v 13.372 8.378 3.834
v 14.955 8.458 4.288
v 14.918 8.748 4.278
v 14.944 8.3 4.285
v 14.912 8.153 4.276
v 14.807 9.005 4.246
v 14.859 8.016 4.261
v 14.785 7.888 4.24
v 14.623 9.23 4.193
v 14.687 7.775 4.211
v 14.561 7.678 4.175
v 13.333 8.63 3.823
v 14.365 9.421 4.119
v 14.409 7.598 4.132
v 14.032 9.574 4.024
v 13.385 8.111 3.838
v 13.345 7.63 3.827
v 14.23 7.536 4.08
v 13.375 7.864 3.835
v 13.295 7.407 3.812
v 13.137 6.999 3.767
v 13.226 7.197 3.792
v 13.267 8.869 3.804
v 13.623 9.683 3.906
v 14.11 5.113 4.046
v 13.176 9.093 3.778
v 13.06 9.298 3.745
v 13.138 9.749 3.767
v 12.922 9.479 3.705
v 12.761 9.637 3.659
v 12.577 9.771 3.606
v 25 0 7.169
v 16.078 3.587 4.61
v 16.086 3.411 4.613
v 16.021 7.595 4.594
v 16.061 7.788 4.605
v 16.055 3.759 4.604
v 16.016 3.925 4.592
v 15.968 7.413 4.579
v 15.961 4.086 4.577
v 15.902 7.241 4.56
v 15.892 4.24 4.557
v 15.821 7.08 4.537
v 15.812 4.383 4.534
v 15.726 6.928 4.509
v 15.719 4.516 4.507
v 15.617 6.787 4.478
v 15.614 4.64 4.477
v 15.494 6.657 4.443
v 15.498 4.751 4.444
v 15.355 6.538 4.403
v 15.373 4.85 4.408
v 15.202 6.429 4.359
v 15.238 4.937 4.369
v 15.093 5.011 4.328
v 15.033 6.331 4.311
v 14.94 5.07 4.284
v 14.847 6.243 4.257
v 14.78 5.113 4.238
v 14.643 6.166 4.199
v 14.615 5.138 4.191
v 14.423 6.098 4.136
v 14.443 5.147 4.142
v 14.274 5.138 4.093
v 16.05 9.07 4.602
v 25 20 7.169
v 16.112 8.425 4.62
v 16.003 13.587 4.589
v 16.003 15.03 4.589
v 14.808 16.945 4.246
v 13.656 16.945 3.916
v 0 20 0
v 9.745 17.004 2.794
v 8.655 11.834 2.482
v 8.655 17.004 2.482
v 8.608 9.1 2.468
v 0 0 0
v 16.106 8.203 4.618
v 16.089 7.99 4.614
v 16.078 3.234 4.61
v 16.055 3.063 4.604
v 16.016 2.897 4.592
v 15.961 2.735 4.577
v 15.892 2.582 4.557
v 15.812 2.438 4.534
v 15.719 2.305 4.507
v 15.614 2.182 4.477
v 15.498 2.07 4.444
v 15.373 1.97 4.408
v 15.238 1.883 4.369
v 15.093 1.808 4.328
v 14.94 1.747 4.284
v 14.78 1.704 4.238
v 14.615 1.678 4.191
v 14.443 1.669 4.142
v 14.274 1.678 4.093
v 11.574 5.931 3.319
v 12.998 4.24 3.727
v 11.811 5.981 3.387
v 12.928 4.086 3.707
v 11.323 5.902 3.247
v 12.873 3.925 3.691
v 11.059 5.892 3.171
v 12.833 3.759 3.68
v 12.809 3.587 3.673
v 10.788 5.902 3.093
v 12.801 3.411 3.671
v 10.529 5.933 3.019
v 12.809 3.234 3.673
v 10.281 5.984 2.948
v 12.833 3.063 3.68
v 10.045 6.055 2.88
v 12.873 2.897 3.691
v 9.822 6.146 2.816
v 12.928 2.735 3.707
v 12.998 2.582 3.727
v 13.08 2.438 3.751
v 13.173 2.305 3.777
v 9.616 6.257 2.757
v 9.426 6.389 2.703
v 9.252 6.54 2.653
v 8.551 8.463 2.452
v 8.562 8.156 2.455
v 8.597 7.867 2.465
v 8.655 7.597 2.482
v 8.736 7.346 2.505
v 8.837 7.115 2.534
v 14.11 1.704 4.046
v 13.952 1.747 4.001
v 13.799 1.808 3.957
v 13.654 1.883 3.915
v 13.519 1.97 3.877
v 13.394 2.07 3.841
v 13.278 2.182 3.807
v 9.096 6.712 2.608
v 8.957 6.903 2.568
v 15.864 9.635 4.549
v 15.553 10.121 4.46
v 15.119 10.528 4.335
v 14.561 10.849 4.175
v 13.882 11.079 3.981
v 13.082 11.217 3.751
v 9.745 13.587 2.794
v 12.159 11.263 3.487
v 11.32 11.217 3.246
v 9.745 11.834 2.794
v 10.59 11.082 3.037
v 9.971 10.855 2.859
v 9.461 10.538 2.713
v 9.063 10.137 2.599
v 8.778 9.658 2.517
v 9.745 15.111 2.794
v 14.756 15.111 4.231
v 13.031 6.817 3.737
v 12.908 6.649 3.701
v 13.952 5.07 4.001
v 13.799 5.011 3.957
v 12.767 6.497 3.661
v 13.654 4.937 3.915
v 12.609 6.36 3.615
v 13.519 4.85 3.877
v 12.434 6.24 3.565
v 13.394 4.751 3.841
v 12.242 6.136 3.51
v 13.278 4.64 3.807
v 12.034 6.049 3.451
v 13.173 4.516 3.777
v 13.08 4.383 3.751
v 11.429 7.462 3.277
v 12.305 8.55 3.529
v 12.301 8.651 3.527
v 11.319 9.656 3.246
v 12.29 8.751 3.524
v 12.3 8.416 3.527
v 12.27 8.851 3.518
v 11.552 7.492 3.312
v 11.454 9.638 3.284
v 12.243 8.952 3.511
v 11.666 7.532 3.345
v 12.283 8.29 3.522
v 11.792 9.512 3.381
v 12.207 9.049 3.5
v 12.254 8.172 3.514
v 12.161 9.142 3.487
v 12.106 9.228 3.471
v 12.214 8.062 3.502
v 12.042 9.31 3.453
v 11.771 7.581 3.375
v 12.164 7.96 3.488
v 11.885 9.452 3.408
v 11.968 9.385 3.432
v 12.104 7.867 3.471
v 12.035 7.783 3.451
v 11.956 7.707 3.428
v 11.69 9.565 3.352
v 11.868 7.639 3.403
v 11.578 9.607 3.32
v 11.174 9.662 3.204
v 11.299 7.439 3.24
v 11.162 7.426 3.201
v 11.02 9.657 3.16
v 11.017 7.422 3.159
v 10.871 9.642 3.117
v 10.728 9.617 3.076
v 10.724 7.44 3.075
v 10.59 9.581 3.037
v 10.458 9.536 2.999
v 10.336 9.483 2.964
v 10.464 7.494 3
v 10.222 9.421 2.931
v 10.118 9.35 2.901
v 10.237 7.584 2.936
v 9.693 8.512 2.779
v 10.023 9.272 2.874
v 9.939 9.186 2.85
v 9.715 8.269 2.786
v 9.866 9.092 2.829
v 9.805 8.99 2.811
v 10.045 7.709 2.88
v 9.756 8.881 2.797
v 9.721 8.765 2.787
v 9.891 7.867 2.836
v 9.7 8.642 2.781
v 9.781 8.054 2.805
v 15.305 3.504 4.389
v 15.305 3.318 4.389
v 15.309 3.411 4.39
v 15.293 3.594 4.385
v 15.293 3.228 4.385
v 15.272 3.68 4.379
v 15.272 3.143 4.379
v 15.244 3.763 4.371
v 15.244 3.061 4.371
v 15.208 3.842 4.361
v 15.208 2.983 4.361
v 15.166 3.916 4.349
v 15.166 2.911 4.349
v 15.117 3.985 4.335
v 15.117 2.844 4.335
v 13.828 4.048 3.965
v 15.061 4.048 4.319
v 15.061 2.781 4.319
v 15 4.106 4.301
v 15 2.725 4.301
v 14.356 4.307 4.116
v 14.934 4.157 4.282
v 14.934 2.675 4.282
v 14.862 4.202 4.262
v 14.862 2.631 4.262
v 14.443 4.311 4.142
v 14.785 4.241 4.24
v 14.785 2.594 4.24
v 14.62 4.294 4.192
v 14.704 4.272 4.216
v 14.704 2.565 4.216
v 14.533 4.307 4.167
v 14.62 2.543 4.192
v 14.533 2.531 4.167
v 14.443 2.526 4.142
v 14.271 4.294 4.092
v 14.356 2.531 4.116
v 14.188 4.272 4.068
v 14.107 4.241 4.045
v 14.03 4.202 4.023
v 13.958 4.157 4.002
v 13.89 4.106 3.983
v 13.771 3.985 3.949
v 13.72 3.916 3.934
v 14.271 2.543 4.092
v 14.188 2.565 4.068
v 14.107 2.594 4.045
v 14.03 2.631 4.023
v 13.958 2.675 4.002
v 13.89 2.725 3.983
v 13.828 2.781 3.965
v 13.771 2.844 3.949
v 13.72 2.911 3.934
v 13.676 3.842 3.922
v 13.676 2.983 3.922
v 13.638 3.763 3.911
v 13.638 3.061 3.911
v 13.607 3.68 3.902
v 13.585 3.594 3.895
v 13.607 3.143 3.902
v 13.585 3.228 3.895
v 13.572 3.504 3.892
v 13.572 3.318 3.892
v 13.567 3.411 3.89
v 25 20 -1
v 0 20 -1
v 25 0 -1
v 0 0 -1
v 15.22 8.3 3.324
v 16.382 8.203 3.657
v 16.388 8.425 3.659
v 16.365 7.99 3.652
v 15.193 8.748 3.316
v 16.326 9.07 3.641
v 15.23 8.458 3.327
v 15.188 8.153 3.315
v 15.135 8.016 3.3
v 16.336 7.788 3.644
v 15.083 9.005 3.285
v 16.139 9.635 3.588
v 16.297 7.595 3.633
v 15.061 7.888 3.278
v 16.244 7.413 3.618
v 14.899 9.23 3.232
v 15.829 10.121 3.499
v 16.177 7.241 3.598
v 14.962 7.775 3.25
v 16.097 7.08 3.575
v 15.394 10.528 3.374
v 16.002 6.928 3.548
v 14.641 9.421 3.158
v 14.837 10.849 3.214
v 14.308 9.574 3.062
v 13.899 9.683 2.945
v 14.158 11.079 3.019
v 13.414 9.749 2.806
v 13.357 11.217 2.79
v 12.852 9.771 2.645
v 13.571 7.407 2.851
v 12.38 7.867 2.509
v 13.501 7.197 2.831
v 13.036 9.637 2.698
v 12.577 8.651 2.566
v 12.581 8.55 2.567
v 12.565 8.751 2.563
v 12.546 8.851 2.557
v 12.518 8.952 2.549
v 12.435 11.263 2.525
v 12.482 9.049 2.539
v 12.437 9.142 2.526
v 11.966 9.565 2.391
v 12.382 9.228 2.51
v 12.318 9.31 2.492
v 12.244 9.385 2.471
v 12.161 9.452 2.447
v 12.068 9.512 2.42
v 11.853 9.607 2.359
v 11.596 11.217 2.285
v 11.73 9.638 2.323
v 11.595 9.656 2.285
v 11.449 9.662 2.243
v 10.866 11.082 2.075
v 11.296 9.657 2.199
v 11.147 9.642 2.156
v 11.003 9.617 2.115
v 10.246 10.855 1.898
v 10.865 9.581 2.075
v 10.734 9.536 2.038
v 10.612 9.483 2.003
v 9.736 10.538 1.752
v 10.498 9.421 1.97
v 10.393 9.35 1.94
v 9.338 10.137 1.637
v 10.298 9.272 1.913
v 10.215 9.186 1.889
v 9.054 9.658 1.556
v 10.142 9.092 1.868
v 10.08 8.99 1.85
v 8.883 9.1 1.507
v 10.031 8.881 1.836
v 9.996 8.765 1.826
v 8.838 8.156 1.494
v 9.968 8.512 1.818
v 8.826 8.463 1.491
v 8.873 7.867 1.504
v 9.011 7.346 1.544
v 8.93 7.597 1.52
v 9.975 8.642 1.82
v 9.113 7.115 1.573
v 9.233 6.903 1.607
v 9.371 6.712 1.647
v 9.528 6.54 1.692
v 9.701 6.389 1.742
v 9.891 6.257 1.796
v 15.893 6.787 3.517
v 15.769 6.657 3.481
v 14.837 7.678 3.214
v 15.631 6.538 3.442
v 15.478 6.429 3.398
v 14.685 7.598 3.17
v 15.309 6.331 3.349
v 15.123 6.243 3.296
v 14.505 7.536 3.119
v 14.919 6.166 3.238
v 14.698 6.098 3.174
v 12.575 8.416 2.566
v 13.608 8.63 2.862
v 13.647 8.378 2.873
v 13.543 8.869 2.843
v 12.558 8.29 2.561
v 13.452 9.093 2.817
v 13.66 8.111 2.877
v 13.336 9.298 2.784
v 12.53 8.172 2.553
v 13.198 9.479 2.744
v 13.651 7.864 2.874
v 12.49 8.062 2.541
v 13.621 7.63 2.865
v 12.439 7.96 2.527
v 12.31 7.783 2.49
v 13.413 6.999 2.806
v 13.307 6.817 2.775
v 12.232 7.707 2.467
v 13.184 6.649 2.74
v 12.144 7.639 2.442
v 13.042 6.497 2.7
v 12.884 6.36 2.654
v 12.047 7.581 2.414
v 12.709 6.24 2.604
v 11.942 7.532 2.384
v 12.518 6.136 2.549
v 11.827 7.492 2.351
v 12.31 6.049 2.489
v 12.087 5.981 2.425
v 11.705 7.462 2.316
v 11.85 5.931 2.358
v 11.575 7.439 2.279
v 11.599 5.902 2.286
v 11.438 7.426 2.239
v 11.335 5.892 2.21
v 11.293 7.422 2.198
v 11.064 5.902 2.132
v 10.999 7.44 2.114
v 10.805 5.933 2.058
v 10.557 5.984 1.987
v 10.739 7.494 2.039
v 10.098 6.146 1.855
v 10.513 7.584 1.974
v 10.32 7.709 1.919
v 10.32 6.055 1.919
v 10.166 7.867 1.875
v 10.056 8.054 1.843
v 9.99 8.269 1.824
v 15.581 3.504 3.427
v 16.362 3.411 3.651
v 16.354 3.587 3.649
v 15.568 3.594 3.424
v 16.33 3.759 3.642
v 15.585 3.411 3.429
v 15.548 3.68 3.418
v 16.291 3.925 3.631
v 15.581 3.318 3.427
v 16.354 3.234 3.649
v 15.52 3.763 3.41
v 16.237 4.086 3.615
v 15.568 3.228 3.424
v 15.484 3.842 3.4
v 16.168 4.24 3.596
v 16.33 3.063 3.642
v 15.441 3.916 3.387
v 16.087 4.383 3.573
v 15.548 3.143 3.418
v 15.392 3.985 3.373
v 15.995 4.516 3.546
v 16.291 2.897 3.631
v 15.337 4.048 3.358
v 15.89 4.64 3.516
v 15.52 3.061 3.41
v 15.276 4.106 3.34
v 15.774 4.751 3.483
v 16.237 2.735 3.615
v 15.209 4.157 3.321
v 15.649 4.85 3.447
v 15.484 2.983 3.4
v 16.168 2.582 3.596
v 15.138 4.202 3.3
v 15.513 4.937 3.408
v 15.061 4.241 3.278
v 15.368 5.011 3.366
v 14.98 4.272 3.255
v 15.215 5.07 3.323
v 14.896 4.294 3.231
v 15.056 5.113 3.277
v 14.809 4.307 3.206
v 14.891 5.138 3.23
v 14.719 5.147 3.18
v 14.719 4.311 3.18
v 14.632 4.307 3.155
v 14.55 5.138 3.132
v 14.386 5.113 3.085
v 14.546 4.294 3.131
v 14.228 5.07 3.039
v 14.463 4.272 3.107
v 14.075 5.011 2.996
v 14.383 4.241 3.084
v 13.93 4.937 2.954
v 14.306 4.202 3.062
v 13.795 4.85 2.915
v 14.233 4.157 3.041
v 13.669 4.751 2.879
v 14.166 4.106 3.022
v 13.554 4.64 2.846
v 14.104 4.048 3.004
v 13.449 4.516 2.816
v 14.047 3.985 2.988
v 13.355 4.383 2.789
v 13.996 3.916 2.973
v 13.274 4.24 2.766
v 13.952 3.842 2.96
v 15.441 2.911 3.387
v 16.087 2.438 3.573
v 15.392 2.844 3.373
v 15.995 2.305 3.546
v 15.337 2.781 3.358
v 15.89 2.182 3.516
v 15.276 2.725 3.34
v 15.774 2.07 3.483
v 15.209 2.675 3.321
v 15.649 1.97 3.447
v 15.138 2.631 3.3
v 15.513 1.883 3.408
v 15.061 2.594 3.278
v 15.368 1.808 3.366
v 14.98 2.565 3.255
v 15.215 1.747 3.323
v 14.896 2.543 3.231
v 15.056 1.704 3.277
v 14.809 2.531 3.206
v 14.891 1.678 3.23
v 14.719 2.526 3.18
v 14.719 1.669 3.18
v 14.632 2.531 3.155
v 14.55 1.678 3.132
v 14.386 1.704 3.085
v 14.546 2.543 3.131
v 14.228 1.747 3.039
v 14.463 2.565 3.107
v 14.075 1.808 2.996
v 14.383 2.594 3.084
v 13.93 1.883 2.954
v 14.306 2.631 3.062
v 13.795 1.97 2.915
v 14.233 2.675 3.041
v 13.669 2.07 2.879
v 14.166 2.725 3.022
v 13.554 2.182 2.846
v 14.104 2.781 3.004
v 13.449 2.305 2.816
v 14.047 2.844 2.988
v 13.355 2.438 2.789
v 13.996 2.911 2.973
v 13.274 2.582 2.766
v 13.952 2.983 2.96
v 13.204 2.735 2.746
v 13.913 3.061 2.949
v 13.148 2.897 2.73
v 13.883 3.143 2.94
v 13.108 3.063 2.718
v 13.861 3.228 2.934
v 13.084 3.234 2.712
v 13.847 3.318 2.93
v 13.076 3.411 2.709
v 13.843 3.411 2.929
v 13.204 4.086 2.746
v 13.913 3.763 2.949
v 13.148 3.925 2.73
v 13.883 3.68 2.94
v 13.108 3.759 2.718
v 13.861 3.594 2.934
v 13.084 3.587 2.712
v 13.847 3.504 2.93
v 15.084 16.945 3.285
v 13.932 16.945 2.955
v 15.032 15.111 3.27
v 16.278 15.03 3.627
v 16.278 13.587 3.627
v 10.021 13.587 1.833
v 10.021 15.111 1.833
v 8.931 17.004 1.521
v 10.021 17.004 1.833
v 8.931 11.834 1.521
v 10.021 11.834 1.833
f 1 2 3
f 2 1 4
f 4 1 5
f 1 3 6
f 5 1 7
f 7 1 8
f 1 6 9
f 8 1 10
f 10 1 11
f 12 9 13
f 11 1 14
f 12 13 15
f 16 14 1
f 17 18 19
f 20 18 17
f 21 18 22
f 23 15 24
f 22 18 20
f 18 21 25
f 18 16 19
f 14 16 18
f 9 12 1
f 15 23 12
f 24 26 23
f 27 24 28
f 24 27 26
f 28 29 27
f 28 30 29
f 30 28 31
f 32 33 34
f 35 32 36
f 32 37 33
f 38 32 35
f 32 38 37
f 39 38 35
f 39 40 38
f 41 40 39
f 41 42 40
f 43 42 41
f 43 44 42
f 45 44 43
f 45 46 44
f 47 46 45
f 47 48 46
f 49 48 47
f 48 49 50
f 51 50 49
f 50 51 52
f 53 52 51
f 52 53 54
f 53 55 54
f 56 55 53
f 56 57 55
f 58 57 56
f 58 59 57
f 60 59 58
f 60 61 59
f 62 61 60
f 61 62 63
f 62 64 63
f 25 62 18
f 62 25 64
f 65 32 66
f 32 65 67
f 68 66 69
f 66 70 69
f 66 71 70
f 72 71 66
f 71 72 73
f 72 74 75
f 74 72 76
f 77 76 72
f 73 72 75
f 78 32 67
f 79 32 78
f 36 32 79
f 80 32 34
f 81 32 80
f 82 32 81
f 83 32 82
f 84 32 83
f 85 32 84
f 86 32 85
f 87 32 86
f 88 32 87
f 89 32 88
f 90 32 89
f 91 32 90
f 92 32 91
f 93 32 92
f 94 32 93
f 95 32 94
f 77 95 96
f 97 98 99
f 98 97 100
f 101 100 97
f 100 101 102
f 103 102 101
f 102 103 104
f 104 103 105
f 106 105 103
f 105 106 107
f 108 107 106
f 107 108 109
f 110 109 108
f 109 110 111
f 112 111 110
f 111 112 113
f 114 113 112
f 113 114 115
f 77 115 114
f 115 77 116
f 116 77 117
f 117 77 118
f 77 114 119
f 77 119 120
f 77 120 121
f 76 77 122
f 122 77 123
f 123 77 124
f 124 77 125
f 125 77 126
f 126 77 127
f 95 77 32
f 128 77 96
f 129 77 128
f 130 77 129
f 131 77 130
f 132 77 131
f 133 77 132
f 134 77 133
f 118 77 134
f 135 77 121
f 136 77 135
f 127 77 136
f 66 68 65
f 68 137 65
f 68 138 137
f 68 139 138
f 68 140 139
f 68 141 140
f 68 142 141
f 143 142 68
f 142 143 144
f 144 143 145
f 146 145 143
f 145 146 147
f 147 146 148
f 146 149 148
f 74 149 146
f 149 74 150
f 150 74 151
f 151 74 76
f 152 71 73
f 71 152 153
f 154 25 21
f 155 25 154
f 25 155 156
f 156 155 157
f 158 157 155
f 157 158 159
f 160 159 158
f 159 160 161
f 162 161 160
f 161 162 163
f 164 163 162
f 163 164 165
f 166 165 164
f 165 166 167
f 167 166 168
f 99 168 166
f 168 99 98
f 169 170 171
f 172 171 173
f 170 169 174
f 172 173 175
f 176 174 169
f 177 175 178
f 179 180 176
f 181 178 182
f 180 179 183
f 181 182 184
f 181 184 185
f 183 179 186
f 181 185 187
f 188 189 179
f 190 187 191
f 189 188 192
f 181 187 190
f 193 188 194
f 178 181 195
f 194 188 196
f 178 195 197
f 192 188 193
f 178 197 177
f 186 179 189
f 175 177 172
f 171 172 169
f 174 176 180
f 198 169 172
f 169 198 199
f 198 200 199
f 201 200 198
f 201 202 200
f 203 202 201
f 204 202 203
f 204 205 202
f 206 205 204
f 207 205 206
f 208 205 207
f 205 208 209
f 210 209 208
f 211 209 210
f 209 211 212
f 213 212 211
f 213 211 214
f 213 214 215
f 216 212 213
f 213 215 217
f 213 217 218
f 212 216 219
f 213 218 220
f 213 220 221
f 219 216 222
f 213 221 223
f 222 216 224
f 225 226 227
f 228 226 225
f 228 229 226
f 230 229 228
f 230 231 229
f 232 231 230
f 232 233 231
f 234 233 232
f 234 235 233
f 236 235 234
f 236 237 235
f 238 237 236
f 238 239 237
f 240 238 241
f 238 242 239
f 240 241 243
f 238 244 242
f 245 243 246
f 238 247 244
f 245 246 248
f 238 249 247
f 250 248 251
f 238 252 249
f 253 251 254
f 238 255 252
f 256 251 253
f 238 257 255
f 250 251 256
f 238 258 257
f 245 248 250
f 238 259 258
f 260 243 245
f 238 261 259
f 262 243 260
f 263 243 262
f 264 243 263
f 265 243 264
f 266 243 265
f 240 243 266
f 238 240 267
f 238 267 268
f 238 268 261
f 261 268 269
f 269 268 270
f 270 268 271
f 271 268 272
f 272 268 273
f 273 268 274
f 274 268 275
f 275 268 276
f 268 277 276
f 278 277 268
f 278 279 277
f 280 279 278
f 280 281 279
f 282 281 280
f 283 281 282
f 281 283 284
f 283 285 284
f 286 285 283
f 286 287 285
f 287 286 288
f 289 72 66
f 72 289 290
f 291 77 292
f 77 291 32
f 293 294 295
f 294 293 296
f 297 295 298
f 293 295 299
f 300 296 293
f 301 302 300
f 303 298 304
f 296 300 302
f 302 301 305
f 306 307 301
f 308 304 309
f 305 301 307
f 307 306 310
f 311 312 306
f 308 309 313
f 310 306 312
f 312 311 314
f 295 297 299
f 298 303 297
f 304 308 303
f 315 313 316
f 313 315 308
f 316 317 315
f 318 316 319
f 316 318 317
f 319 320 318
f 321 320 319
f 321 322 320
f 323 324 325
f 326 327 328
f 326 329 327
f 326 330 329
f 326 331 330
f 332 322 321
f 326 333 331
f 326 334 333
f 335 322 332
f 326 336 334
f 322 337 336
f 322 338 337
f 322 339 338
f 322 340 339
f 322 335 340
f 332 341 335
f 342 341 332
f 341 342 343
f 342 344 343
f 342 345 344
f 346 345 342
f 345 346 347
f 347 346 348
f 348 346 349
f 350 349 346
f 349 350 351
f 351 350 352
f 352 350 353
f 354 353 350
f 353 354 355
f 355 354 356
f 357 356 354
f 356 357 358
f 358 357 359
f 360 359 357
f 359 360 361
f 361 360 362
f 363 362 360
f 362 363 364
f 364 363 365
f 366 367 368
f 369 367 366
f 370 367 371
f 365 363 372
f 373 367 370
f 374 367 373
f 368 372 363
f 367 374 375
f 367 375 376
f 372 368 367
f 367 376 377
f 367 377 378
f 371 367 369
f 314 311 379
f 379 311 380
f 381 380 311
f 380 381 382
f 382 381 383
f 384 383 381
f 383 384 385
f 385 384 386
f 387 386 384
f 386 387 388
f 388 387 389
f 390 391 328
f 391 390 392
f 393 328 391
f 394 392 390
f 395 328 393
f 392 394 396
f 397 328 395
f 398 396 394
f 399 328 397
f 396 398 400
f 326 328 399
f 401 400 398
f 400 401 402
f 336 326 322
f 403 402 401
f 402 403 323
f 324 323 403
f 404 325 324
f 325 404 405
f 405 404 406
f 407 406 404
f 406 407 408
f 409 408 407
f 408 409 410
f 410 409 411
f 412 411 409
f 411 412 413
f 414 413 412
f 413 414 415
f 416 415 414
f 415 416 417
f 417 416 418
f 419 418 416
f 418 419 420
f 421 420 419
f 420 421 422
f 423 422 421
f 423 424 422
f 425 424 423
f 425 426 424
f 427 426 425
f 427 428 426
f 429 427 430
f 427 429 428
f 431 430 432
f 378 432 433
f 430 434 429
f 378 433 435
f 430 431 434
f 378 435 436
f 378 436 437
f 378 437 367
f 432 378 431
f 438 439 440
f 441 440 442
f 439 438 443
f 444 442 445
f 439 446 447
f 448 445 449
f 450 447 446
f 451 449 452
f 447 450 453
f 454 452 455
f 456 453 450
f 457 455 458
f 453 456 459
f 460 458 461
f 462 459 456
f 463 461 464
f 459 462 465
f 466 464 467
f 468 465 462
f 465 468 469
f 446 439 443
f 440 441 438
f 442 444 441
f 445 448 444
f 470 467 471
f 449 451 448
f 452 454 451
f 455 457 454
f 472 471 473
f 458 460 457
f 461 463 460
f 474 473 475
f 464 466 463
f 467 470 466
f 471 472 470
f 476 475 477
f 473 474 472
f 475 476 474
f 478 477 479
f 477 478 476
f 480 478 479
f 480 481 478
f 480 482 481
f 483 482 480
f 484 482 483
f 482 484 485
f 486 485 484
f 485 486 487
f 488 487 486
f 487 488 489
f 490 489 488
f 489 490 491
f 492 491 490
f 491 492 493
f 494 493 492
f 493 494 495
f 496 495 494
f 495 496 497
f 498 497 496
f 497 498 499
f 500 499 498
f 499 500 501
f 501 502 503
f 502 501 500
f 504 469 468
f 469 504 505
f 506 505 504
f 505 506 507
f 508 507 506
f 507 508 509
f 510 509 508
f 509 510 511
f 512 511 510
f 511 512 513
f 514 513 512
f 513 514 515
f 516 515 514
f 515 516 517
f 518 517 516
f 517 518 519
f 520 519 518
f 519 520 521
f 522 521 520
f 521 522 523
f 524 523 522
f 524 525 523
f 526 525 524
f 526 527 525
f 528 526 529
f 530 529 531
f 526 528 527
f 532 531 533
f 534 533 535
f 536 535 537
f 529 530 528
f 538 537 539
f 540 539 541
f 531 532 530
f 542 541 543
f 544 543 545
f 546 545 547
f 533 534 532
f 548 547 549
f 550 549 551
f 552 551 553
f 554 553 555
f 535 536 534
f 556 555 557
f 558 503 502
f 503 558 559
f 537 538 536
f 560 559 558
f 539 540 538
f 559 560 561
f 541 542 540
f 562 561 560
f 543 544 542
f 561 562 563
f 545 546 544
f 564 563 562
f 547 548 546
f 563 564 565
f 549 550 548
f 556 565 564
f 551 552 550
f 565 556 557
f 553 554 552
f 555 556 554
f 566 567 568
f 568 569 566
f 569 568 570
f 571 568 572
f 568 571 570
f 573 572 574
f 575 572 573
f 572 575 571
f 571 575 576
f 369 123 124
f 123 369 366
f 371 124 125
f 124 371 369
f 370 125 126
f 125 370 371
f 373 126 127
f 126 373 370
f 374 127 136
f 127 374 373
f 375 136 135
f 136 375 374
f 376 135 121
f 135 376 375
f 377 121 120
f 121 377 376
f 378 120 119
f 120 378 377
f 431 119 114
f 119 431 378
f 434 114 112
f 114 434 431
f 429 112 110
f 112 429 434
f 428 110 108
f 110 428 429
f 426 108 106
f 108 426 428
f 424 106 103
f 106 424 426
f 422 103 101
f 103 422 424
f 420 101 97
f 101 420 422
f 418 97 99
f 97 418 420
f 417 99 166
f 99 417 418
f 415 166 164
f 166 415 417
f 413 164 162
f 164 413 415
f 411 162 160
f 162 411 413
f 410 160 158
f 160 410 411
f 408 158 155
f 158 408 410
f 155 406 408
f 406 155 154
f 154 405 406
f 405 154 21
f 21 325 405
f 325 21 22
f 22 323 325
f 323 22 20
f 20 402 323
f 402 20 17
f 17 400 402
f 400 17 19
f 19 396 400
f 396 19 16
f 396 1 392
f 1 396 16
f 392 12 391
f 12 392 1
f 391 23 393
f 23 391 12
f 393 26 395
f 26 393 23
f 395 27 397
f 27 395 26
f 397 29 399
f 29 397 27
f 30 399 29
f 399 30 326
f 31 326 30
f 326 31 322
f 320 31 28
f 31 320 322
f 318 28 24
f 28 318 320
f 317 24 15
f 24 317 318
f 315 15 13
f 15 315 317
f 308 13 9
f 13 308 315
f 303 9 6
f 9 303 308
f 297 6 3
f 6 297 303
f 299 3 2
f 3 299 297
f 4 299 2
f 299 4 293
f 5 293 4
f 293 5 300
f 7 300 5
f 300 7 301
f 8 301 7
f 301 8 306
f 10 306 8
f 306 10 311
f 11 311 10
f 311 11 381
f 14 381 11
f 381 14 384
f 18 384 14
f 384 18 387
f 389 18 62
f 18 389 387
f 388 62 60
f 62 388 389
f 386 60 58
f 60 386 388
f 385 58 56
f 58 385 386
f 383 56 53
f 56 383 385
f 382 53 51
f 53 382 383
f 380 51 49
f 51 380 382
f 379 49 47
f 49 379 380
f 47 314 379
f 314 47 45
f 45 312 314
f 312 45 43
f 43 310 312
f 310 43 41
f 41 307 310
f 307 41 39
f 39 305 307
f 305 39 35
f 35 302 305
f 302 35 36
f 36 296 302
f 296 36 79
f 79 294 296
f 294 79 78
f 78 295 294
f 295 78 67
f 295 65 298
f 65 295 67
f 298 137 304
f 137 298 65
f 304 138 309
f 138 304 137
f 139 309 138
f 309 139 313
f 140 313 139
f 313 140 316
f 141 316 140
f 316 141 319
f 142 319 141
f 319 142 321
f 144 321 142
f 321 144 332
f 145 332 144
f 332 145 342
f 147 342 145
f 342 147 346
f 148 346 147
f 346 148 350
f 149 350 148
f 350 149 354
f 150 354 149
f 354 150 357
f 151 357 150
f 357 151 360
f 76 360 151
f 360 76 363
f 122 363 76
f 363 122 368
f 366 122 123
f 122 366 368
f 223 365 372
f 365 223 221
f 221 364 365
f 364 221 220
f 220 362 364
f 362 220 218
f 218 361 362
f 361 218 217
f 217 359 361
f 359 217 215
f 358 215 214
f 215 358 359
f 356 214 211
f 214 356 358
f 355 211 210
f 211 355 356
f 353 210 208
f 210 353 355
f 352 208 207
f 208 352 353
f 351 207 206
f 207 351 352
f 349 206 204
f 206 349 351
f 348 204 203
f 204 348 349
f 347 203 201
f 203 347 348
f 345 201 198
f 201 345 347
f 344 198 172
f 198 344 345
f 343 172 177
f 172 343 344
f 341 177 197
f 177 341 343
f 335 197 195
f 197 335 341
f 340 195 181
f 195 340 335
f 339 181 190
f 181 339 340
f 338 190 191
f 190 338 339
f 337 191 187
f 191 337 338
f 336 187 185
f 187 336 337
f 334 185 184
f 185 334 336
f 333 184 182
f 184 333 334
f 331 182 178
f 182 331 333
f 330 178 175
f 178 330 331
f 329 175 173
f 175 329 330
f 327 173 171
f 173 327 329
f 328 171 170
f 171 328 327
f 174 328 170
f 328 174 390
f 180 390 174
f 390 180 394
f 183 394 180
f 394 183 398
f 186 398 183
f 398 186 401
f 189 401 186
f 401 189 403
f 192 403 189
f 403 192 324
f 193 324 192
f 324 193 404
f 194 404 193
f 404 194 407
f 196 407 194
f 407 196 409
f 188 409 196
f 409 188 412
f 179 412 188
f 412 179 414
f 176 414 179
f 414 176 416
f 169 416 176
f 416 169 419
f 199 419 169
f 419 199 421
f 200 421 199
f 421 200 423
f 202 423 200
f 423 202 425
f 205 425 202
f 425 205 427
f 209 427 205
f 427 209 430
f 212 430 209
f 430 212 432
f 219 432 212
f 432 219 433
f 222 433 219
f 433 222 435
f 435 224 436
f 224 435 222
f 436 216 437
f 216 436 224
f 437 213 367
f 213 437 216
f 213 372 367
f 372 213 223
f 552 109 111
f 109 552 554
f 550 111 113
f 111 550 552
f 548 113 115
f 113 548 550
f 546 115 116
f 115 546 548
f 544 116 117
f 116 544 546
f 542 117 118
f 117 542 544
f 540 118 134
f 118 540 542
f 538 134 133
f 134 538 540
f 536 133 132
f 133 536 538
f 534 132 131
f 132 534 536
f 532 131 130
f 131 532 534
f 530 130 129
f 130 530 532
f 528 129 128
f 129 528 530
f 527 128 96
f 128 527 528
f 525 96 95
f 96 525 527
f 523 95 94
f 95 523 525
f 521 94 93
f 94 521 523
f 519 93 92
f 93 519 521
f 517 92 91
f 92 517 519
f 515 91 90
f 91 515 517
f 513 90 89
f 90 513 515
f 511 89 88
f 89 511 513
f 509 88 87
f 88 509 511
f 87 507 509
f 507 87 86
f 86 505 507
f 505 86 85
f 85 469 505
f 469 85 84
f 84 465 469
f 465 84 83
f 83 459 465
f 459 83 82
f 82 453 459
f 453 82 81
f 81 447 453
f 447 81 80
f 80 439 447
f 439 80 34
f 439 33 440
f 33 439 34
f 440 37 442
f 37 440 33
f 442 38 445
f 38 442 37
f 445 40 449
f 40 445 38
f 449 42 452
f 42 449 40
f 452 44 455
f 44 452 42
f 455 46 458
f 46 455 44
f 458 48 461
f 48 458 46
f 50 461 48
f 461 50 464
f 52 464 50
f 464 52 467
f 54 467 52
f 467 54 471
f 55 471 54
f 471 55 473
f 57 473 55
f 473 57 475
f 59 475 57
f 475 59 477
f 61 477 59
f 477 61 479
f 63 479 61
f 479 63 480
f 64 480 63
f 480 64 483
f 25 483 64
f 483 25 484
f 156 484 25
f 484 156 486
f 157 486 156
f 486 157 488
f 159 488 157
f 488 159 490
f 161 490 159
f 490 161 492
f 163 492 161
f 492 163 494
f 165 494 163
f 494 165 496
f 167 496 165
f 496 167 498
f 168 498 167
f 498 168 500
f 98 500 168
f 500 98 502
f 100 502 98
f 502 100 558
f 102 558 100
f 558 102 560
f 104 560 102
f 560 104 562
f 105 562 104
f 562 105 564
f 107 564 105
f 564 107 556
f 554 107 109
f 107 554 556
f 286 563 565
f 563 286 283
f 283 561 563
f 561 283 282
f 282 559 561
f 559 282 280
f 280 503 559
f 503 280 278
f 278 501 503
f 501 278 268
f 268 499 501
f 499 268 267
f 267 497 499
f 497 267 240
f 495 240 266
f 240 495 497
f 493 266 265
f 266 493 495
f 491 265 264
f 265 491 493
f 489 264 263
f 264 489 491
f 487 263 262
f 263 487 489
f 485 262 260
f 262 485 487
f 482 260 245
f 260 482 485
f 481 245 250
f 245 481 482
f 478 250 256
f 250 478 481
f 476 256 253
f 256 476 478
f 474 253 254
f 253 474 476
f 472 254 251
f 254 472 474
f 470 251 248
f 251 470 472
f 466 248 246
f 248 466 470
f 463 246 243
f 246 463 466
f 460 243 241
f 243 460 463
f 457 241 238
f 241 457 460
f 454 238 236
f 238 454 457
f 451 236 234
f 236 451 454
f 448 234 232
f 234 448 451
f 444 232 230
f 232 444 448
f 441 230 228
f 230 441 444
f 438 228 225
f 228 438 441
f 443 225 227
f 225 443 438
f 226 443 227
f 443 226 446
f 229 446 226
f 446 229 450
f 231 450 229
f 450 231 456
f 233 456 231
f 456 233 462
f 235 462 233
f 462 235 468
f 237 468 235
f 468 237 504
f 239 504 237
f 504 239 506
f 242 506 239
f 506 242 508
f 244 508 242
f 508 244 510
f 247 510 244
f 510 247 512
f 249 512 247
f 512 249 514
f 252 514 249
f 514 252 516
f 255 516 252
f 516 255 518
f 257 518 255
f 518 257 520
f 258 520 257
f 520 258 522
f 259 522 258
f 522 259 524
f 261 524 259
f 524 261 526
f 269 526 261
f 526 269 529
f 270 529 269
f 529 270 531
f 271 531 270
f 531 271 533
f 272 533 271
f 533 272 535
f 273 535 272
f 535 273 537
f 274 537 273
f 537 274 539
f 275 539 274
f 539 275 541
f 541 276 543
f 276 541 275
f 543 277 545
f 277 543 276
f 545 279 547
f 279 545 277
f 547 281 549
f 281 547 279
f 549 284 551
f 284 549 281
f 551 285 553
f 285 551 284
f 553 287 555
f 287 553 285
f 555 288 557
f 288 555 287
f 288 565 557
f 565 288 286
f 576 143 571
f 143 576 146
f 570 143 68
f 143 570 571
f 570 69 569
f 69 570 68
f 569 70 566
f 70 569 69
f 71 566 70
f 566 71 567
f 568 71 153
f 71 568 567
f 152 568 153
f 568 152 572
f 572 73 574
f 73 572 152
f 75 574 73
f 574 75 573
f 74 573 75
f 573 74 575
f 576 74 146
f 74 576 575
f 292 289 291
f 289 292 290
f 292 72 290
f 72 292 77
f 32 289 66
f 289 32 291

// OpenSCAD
// This work was created by David Turnbull and released under a 
// Creative Commons Attribution 4.0 International License.

// Which part would you like to see?
part = "Main"; // [Main:Angle Guide Block,Text:Text For Multi Extruder]
// Blade guide angle
angle = 16; // [10:1:40]
// Rubber band slot width (0=none)
width = 0; // [0:6]


if (part == "Main") {
    bandselect();
} else {
    rotate([0,-angle,0])
    mark(1);
}

module bandselect() {
    ht = tan(angle) * (19-width/2) - 2.5;
    
    if (ht < 1.5) {
        banded(1.5);
    } else if (ht > 4) {
        banded(4);
    } else {
        banded(ht);
    }
}

module banded(ht) {
    difference() {
        fitted();
        
        translate([19-width/2,-1, ht])
        cube([width,22,20]);

        translate([19-width/2 , 19, ht - 1])
        filet();

        translate([19-width/2 , 1, ht - 1])
        rotate([90,0,0])
        filet();

    }
    
}


module filet() {
    difference() {
        cube([width, 1.01, 1.01]);
        
        rotate([0,90,0])
        translate([0,0,-1])
        cylinder(width + 2, 1, 1, $fn = 32);
    }
}

module fitted() {
    difference() {
        union() {
            rotate([0,-angle,0])
            embossed();
            
            translate([0,0,-1])
            cube([1,20,1]);

        }
        
        translate([25,-1,-2])
        cube([200,22,100]);

        translate([0,-1,-101])
        cube([200,22,100]);

    }


}


module embossed() {
    
    difference() {
        translate([0,0,-100])
        cube([100,20,100]);

        mark(1.01);
    }
}

module mark(ht) {
    if (width != 0) {
        mark2(8,ht);
    } else {
        mark2(12.5,ht);
    }    
}

module mark2(x,ht) {
    adjx = sqrt(pow(tan(angle) * x,2) + pow(x,2)) - 4;

    translate([adjx,9.5,-1])
    rotate([0,0,-90])
    linear_extrude(height = ht) {
        text(text = str(angle,"\u00B0"),
            font = "Liberation Sans:style=Bold", 
            size = 8,
            halign = "center"

        );
     }
}
